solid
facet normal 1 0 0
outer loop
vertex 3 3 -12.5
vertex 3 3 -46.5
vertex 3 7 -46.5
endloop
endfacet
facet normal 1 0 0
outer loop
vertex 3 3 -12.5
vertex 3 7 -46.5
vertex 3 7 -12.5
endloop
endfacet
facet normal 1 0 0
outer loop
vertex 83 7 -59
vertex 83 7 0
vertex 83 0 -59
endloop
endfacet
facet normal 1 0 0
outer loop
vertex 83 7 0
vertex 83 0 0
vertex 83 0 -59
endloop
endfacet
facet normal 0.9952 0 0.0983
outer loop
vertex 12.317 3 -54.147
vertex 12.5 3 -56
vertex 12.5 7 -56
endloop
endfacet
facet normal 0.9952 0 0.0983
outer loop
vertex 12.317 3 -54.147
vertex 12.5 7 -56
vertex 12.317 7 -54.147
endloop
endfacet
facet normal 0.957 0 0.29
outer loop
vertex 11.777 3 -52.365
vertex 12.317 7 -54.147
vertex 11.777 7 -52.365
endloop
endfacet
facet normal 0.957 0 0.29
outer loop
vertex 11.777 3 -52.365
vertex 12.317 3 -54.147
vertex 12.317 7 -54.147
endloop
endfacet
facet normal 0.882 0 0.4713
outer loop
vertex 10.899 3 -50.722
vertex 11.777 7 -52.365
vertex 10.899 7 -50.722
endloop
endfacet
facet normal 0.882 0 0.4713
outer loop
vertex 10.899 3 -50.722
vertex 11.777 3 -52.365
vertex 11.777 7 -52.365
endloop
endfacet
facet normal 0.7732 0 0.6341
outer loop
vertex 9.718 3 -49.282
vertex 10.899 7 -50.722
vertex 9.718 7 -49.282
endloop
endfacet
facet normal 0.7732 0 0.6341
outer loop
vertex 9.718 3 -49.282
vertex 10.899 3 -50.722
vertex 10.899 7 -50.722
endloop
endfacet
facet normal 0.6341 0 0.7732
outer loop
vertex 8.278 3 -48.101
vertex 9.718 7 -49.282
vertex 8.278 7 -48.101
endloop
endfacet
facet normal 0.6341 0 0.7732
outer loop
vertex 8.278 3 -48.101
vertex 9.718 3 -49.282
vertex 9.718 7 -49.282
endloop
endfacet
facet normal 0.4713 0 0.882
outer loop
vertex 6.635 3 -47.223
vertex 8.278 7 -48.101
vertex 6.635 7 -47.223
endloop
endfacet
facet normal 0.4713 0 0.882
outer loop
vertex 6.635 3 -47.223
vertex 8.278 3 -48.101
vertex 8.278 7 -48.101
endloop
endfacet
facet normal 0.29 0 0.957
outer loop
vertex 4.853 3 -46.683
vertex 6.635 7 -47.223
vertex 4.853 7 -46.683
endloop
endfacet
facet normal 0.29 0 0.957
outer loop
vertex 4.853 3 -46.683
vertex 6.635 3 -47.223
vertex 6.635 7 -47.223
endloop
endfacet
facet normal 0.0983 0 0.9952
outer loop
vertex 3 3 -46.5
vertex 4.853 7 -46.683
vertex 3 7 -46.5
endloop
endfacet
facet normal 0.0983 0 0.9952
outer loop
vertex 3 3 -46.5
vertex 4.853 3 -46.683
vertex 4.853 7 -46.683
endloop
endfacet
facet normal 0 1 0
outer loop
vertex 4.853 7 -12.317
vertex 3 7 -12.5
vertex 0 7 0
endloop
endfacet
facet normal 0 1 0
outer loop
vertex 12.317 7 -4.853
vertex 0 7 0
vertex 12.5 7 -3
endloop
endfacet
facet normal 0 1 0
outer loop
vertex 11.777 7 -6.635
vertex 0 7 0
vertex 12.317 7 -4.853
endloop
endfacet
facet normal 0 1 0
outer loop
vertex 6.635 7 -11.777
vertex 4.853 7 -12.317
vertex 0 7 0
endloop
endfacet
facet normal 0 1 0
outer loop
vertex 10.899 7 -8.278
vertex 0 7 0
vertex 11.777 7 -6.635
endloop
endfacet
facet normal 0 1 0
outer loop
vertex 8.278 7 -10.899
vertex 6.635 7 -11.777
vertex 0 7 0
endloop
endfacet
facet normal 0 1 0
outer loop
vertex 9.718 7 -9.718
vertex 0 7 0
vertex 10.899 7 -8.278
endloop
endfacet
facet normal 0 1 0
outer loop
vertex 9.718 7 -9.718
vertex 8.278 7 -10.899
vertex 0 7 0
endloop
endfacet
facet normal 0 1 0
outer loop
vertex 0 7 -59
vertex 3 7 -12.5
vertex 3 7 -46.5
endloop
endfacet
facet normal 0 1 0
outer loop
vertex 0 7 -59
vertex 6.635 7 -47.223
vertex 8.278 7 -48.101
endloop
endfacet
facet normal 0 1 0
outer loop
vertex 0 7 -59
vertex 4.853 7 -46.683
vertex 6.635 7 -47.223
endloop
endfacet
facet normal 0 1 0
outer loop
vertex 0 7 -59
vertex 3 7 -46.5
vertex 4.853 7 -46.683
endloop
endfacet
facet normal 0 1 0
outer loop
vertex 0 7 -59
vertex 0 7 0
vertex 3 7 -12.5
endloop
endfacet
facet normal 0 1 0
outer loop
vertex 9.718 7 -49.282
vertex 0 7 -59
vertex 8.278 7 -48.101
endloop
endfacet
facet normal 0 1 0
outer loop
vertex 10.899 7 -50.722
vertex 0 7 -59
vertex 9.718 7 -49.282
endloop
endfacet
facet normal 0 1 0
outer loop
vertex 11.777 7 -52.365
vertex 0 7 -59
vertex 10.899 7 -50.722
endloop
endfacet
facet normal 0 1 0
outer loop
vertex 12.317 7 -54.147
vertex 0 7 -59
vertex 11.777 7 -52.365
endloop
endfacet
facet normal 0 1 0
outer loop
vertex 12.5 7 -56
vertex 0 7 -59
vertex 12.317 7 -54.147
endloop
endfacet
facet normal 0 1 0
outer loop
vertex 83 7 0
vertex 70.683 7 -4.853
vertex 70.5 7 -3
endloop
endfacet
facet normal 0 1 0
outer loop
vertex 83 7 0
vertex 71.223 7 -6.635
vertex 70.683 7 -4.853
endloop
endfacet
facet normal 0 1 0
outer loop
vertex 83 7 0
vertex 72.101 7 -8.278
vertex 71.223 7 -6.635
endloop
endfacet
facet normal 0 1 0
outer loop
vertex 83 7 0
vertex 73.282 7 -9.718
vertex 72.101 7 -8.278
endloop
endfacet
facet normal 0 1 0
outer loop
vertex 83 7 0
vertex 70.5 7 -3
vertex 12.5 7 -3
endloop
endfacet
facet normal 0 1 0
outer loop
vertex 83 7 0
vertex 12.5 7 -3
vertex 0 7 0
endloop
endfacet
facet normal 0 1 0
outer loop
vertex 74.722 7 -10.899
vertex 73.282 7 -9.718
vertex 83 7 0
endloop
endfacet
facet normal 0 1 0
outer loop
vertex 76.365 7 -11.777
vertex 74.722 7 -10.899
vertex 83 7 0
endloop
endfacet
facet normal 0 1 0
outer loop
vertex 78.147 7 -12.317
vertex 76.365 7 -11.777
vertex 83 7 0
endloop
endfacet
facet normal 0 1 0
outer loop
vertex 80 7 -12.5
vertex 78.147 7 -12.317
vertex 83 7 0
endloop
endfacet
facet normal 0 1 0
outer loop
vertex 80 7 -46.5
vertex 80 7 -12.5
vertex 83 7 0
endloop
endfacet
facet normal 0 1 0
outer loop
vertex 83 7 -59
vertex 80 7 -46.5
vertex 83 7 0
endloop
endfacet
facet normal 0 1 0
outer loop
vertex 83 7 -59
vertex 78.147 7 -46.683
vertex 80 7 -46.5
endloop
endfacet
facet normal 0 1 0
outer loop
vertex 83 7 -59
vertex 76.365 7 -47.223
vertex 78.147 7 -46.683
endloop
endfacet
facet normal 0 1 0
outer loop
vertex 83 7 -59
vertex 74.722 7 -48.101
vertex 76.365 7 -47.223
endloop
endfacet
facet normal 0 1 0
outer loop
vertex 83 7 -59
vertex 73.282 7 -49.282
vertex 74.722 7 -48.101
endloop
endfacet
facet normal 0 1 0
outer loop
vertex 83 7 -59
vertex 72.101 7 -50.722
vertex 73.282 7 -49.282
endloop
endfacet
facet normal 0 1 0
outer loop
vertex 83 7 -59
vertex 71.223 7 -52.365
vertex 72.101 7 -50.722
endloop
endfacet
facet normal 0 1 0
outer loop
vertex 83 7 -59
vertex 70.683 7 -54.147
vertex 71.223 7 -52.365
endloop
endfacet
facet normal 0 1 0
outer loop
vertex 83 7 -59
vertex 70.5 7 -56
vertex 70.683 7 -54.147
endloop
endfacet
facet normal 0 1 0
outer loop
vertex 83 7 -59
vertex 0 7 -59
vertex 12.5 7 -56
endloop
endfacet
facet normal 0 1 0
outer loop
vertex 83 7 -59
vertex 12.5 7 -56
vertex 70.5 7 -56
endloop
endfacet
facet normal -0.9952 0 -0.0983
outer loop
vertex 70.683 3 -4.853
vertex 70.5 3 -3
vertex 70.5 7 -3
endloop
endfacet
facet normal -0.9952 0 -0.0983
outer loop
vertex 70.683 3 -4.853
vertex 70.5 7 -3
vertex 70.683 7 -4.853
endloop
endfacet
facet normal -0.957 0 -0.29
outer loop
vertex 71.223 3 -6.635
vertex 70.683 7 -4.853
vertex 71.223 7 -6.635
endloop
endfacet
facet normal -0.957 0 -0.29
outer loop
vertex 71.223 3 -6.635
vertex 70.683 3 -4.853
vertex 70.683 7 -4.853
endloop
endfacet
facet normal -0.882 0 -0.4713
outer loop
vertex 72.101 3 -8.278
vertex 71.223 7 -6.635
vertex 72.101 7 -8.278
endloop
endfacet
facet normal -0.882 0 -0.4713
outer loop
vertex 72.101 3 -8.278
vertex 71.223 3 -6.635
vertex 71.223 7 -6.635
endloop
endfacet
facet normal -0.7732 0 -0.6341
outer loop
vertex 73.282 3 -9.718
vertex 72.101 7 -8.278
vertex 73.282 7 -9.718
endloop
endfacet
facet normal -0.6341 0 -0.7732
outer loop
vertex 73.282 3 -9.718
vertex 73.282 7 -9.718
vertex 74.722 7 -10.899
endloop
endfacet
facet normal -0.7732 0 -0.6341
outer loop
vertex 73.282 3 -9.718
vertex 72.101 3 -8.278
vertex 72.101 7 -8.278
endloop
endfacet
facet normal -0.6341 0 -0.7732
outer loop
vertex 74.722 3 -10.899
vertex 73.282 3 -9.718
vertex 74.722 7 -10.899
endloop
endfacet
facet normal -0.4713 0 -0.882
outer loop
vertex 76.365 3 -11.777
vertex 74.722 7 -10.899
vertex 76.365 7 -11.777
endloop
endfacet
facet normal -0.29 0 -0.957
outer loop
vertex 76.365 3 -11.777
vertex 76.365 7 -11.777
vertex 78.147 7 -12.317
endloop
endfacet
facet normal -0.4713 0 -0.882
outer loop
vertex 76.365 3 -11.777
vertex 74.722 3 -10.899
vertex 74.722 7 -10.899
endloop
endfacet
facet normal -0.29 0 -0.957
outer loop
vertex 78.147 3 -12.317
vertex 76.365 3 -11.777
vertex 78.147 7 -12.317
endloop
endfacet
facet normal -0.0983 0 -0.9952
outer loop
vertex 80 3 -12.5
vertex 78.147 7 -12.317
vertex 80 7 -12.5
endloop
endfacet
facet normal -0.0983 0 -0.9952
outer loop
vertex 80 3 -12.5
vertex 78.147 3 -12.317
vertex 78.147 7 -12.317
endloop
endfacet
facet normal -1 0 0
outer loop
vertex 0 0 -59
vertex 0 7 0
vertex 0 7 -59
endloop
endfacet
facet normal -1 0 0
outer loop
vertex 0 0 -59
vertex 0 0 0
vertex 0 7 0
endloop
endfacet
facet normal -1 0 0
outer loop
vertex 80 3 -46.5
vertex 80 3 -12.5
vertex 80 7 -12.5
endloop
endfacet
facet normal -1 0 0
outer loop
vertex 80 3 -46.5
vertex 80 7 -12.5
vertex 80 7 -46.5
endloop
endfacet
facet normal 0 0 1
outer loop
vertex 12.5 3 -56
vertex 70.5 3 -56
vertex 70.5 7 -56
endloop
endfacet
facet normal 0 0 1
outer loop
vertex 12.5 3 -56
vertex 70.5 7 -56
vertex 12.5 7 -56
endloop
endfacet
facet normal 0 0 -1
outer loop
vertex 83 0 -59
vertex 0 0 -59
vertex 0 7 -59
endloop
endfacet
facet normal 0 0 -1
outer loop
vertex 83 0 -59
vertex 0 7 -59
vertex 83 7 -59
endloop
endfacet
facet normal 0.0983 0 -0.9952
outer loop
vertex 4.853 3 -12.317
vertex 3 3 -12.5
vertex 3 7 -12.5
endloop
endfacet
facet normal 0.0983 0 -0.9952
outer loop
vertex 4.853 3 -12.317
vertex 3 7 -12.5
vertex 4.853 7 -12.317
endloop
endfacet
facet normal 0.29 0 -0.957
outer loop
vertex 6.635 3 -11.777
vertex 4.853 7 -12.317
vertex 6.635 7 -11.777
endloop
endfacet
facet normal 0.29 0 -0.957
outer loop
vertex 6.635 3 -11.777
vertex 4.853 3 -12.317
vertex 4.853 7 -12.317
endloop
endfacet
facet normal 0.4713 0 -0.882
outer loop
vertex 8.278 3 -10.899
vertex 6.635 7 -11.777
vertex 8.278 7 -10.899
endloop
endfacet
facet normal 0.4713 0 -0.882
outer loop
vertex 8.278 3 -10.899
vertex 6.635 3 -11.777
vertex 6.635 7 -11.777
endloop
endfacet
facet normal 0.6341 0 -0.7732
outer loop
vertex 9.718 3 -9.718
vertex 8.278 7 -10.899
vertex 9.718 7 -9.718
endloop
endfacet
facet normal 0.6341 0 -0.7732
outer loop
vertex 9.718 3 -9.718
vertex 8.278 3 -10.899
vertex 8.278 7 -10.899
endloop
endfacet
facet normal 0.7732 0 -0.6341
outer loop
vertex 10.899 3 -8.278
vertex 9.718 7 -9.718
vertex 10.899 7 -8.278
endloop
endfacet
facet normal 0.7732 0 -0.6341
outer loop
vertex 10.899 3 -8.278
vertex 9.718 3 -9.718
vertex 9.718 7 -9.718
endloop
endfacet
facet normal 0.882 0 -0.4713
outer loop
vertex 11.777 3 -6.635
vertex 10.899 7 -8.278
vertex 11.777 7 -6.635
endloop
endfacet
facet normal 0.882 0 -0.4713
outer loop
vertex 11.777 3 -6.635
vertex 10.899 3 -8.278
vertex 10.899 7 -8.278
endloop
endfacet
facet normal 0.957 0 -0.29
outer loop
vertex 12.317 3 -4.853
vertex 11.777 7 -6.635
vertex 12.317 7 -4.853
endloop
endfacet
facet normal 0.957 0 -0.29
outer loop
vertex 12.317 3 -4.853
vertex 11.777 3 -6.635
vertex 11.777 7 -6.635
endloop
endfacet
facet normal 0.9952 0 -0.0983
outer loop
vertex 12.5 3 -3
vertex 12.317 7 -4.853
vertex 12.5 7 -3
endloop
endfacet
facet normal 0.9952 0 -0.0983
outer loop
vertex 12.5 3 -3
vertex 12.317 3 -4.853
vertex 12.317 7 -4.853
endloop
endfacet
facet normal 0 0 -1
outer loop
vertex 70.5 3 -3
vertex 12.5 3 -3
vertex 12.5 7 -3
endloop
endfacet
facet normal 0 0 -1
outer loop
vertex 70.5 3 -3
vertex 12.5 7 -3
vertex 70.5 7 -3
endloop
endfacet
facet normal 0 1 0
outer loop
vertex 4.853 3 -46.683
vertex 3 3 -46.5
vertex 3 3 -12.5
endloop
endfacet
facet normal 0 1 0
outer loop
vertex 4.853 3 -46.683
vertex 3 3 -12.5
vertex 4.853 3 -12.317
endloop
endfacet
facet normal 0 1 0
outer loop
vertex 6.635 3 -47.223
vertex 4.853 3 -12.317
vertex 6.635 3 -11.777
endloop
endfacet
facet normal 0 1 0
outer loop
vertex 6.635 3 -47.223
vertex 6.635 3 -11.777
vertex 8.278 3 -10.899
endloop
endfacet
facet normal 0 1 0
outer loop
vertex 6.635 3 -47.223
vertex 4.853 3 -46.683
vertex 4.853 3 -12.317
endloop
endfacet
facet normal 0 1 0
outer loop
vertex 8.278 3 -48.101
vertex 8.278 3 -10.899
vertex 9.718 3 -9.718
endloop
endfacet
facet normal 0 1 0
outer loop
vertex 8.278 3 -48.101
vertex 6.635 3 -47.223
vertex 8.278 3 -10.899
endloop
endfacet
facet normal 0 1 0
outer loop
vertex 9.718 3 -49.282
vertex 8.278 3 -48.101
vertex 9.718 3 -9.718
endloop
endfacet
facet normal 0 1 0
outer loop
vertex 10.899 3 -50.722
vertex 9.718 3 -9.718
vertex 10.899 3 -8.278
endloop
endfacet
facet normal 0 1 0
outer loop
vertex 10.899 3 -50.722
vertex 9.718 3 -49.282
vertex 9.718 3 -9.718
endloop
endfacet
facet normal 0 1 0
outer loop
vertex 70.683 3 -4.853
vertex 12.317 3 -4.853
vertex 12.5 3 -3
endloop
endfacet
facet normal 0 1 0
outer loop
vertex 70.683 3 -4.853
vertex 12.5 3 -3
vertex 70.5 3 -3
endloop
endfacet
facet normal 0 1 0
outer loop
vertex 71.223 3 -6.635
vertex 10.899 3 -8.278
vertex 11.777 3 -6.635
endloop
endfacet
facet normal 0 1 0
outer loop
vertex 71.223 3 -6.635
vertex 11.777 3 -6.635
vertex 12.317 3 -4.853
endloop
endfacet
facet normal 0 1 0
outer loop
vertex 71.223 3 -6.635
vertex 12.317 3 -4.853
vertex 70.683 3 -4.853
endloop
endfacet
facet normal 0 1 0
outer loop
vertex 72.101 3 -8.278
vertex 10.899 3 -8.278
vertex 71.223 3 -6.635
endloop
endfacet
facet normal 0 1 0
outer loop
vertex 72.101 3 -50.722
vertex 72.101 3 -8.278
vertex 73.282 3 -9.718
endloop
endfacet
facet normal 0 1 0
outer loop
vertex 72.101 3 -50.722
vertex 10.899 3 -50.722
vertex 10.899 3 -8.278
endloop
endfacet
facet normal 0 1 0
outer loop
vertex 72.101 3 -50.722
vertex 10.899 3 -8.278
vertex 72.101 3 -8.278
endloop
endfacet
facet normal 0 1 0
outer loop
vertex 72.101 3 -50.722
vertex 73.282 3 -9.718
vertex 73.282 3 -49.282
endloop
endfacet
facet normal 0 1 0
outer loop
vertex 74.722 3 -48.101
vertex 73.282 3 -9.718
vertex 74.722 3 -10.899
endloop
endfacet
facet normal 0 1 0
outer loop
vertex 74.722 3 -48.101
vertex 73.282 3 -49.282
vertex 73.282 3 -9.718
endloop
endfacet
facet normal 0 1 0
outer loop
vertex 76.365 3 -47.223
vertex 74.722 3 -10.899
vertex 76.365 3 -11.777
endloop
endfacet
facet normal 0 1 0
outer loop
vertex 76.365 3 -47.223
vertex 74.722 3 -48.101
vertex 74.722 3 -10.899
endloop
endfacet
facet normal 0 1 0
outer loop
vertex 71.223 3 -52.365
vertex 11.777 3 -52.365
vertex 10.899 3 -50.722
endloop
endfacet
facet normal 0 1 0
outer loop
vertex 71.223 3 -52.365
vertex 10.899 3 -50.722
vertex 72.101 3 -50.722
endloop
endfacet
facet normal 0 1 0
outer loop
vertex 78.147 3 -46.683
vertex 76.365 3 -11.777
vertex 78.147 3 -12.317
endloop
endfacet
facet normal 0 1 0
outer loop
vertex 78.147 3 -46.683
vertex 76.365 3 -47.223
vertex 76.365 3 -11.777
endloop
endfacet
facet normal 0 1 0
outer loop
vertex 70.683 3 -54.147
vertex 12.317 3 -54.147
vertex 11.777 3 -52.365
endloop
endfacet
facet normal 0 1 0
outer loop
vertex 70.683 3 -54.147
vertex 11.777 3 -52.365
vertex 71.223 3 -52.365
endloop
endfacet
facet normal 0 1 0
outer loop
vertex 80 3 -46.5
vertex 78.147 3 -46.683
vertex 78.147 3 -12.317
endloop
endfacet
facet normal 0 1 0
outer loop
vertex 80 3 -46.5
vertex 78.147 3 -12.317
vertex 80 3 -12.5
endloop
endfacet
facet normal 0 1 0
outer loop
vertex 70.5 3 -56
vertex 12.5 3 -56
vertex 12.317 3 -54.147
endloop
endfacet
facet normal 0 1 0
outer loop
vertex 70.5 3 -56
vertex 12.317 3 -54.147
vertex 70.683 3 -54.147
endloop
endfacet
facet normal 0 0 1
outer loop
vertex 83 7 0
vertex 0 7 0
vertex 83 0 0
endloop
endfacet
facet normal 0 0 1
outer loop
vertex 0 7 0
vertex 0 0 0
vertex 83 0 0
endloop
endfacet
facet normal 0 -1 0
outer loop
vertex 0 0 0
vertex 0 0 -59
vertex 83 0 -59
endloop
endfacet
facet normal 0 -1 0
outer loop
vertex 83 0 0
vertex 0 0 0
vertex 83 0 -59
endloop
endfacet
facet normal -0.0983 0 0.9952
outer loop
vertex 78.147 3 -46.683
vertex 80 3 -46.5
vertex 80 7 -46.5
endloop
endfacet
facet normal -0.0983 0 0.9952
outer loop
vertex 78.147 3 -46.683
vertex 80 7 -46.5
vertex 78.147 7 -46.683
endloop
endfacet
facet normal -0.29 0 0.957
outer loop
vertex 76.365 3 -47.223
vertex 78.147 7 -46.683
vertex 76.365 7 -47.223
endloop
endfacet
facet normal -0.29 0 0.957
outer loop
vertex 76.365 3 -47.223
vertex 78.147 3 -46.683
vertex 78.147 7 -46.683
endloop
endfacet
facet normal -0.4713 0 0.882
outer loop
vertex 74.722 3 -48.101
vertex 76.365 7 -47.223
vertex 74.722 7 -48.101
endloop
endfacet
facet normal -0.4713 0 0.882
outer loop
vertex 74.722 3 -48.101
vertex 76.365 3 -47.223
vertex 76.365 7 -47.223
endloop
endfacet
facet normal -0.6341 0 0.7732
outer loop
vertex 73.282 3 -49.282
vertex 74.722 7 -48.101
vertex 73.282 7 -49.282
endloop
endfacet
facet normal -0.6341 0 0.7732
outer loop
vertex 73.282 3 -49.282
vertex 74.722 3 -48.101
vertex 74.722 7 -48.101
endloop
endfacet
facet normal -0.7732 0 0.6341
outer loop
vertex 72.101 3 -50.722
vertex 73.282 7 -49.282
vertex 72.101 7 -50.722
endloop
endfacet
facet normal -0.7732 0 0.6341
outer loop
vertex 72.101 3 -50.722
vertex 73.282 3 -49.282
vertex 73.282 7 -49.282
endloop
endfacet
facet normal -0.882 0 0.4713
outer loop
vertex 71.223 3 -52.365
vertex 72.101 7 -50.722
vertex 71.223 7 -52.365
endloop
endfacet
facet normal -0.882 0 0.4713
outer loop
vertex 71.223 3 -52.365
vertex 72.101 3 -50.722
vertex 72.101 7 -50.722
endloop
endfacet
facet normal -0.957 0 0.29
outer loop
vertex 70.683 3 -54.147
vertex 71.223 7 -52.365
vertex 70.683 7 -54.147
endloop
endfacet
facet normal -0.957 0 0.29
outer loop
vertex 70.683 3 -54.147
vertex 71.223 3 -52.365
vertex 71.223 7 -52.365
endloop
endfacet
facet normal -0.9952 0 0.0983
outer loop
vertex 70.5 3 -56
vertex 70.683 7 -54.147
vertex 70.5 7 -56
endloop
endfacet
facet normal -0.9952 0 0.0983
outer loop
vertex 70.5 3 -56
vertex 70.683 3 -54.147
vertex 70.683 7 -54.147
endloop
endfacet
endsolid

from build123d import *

# Parameters (mm, degrees)
SKETCH1_W           = 83
SKETCH1_H           = 59
BOSS_EXTRUDE1_DEPTH = 3
SKETCH2_W           = 83
SKETCH2_H           = 59
BOSS_EXTRUDE2_DEPTH = 4


with BuildPart() as part:
    # Sketch1 → Boss-Extrude1 (new body)
    with BuildSketch(Plane(origin=(0, 0, 0), x_dir=(1, 0, 0), z_dir=(0, 1, 0))):
        with Locations((41.5, 29.5)):
            Rectangle(SKETCH1_W, SKETCH1_H)
    extrude(amount=BOSS_EXTRUDE1_DEPTH)

    # Sketch2 → Boss-Extrude2 (add)
    with BuildSketch(Plane(origin=(0, 3, 0), x_dir=(1, 0, 0), z_dir=(0, 1, 0))):
        with Locations((41.5, 29.5)):
            Rectangle(SKETCH2_W, SKETCH2_H)
        with BuildLine():
            Line((3, 46.5), (3, 12.5))
            ThreePointArc((3, 12.5), (9.717514421, 9.717514421), (12.5, 3))
            Line((12.5, 3), (70.5, 3))
            ThreePointArc((70.5, 3), (73.282485579, 9.717514421), (80, 12.5))
            Line((80, 12.5), (80, 46.5))
            ThreePointArc((80, 46.5), (73.282485579, 49.282485579), (70.5, 56))
            Line((70.5, 56), (12.5, 56))
            ThreePointArc((12.5, 56), (9.717514421, 49.282485579), (3, 46.5))
        make_face(mode=Mode.SUBTRACT)
    extrude(amount=BOSS_EXTRUDE2_DEPTH)


solid = part.part
